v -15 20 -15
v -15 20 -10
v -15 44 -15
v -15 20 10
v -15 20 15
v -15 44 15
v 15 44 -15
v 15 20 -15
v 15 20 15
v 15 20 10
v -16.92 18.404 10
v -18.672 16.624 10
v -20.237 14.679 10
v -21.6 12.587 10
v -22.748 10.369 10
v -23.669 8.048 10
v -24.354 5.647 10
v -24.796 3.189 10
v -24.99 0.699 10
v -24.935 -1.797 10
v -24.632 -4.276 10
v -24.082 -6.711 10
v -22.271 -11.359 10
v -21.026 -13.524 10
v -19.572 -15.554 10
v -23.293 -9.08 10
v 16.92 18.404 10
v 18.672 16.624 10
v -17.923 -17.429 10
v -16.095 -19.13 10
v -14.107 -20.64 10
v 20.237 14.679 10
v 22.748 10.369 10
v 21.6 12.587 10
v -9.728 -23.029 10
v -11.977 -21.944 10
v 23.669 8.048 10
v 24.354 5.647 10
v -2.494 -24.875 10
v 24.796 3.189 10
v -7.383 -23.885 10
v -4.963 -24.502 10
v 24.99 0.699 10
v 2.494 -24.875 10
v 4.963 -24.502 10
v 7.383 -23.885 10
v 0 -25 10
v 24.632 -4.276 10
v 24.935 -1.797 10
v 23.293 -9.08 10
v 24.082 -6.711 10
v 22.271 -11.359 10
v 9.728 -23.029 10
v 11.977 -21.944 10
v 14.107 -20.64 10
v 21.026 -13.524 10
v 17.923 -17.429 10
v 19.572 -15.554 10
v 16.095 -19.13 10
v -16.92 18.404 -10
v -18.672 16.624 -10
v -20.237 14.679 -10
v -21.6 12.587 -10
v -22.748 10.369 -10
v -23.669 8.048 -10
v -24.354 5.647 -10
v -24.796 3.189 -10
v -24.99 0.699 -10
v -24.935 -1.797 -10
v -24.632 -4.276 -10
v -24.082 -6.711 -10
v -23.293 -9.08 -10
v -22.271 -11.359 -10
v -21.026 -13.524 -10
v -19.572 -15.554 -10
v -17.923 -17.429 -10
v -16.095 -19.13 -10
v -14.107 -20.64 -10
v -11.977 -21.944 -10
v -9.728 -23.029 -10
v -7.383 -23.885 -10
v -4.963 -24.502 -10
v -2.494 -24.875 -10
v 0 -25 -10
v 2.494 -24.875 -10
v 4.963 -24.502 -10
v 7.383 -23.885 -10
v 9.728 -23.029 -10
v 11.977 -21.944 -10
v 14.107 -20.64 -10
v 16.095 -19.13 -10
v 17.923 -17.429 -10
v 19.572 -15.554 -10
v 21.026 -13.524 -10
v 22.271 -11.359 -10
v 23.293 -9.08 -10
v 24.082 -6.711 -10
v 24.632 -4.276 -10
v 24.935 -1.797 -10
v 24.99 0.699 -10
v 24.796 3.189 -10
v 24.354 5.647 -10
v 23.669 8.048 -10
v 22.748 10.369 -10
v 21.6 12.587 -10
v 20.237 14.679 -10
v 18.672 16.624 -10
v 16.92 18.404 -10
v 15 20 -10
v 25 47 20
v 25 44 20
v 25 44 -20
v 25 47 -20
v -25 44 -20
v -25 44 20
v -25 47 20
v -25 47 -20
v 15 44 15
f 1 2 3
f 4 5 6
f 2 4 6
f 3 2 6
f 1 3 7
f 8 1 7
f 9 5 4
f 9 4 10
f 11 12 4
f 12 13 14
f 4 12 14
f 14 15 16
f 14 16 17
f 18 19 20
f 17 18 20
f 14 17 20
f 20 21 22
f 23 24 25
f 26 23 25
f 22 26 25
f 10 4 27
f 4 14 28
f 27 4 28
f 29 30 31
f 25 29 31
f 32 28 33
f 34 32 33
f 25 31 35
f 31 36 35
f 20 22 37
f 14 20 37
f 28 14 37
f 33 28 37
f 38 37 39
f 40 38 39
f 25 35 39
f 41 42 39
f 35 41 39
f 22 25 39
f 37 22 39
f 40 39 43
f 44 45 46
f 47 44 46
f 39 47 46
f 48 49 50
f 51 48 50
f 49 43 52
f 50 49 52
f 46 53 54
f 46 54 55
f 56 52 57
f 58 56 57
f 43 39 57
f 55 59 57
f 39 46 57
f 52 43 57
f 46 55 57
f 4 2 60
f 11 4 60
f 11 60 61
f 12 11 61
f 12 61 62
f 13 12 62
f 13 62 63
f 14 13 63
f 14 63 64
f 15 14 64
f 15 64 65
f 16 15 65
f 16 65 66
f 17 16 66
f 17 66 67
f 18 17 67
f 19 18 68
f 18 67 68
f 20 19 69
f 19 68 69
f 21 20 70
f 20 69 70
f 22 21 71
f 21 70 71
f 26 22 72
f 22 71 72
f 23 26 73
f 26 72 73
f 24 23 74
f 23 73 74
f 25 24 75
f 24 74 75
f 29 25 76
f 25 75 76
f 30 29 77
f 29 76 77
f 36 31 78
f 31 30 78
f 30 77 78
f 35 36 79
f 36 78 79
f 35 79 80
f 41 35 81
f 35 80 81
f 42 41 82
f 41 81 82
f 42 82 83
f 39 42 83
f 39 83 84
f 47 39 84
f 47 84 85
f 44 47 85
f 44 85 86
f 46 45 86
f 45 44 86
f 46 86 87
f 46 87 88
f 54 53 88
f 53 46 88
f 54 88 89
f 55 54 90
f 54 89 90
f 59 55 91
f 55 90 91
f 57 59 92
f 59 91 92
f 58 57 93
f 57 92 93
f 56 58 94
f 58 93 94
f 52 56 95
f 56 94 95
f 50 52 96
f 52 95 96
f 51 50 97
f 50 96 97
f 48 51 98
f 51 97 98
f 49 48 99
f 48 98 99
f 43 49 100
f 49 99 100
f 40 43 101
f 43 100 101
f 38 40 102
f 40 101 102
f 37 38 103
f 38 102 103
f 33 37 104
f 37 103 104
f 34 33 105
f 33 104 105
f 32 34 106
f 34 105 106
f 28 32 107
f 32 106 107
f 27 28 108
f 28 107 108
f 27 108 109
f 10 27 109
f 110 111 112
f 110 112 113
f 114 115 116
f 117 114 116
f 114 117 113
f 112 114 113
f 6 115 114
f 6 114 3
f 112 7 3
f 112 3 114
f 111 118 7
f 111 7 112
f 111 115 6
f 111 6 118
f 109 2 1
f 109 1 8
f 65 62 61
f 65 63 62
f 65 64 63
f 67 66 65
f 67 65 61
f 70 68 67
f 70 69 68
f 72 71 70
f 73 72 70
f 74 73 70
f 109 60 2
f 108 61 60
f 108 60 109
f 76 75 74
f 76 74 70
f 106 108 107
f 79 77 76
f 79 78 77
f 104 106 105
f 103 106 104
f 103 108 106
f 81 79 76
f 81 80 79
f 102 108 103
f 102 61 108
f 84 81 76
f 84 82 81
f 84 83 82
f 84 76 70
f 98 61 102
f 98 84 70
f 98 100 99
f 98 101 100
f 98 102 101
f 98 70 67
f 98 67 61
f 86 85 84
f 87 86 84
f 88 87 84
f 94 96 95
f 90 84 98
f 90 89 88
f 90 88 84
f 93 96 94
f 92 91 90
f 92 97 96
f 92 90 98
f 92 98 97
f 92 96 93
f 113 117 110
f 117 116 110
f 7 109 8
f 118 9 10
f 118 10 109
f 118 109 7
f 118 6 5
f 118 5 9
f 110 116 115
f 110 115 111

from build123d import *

# Parameters (mm, degrees)
SK_CASTERWHEEL_W = 25
SK_CASTERWHEEL_H = 20
SK_FORK_W        = 30
SK_FORK_H        = 24
FORK_DEPTH       = 15
SK_TOPPLATE_W    = 50
SK_TOPPLATE_H    = 3
TOPPLATE_DEPTH   = 20


with BuildPart() as part:
    # SK_CasterWheel → CasterWheel (revolve)
    with BuildSketch(Plane(origin=(0, 0, 0), x_dir=(1, 0, 0), z_dir=(0, 1, 0)), mode=Mode.PRIVATE) as casterwheel_sk:
        with Locations((12.5, 0)):
            Rectangle(SK_CASTERWHEEL_W, SK_CASTERWHEEL_H)
    revolve(casterwheel_sk.sketch.rotate(Axis((0, 0, -15), (0, 0, 1)), 180), axis=Axis((0, 0, -15), (0, 0, 1)))

    # SK_Fork → Fork (add, symmetric)
    with BuildSketch(Plane.XY):
        with Locations((0, 32)):
            Rectangle(SK_FORK_W, SK_FORK_H)
    extrude(amount=FORK_DEPTH, both=True)

    # SK_TopPlate → TopPlate (add, symmetric)
    with BuildSketch(Plane.XY):
        with Locations((0, 45.5)):
            Rectangle(SK_TOPPLATE_W, SK_TOPPLATE_H)
    extrude(amount=TOPPLATE_DEPTH, both=True)


solid = part.part
